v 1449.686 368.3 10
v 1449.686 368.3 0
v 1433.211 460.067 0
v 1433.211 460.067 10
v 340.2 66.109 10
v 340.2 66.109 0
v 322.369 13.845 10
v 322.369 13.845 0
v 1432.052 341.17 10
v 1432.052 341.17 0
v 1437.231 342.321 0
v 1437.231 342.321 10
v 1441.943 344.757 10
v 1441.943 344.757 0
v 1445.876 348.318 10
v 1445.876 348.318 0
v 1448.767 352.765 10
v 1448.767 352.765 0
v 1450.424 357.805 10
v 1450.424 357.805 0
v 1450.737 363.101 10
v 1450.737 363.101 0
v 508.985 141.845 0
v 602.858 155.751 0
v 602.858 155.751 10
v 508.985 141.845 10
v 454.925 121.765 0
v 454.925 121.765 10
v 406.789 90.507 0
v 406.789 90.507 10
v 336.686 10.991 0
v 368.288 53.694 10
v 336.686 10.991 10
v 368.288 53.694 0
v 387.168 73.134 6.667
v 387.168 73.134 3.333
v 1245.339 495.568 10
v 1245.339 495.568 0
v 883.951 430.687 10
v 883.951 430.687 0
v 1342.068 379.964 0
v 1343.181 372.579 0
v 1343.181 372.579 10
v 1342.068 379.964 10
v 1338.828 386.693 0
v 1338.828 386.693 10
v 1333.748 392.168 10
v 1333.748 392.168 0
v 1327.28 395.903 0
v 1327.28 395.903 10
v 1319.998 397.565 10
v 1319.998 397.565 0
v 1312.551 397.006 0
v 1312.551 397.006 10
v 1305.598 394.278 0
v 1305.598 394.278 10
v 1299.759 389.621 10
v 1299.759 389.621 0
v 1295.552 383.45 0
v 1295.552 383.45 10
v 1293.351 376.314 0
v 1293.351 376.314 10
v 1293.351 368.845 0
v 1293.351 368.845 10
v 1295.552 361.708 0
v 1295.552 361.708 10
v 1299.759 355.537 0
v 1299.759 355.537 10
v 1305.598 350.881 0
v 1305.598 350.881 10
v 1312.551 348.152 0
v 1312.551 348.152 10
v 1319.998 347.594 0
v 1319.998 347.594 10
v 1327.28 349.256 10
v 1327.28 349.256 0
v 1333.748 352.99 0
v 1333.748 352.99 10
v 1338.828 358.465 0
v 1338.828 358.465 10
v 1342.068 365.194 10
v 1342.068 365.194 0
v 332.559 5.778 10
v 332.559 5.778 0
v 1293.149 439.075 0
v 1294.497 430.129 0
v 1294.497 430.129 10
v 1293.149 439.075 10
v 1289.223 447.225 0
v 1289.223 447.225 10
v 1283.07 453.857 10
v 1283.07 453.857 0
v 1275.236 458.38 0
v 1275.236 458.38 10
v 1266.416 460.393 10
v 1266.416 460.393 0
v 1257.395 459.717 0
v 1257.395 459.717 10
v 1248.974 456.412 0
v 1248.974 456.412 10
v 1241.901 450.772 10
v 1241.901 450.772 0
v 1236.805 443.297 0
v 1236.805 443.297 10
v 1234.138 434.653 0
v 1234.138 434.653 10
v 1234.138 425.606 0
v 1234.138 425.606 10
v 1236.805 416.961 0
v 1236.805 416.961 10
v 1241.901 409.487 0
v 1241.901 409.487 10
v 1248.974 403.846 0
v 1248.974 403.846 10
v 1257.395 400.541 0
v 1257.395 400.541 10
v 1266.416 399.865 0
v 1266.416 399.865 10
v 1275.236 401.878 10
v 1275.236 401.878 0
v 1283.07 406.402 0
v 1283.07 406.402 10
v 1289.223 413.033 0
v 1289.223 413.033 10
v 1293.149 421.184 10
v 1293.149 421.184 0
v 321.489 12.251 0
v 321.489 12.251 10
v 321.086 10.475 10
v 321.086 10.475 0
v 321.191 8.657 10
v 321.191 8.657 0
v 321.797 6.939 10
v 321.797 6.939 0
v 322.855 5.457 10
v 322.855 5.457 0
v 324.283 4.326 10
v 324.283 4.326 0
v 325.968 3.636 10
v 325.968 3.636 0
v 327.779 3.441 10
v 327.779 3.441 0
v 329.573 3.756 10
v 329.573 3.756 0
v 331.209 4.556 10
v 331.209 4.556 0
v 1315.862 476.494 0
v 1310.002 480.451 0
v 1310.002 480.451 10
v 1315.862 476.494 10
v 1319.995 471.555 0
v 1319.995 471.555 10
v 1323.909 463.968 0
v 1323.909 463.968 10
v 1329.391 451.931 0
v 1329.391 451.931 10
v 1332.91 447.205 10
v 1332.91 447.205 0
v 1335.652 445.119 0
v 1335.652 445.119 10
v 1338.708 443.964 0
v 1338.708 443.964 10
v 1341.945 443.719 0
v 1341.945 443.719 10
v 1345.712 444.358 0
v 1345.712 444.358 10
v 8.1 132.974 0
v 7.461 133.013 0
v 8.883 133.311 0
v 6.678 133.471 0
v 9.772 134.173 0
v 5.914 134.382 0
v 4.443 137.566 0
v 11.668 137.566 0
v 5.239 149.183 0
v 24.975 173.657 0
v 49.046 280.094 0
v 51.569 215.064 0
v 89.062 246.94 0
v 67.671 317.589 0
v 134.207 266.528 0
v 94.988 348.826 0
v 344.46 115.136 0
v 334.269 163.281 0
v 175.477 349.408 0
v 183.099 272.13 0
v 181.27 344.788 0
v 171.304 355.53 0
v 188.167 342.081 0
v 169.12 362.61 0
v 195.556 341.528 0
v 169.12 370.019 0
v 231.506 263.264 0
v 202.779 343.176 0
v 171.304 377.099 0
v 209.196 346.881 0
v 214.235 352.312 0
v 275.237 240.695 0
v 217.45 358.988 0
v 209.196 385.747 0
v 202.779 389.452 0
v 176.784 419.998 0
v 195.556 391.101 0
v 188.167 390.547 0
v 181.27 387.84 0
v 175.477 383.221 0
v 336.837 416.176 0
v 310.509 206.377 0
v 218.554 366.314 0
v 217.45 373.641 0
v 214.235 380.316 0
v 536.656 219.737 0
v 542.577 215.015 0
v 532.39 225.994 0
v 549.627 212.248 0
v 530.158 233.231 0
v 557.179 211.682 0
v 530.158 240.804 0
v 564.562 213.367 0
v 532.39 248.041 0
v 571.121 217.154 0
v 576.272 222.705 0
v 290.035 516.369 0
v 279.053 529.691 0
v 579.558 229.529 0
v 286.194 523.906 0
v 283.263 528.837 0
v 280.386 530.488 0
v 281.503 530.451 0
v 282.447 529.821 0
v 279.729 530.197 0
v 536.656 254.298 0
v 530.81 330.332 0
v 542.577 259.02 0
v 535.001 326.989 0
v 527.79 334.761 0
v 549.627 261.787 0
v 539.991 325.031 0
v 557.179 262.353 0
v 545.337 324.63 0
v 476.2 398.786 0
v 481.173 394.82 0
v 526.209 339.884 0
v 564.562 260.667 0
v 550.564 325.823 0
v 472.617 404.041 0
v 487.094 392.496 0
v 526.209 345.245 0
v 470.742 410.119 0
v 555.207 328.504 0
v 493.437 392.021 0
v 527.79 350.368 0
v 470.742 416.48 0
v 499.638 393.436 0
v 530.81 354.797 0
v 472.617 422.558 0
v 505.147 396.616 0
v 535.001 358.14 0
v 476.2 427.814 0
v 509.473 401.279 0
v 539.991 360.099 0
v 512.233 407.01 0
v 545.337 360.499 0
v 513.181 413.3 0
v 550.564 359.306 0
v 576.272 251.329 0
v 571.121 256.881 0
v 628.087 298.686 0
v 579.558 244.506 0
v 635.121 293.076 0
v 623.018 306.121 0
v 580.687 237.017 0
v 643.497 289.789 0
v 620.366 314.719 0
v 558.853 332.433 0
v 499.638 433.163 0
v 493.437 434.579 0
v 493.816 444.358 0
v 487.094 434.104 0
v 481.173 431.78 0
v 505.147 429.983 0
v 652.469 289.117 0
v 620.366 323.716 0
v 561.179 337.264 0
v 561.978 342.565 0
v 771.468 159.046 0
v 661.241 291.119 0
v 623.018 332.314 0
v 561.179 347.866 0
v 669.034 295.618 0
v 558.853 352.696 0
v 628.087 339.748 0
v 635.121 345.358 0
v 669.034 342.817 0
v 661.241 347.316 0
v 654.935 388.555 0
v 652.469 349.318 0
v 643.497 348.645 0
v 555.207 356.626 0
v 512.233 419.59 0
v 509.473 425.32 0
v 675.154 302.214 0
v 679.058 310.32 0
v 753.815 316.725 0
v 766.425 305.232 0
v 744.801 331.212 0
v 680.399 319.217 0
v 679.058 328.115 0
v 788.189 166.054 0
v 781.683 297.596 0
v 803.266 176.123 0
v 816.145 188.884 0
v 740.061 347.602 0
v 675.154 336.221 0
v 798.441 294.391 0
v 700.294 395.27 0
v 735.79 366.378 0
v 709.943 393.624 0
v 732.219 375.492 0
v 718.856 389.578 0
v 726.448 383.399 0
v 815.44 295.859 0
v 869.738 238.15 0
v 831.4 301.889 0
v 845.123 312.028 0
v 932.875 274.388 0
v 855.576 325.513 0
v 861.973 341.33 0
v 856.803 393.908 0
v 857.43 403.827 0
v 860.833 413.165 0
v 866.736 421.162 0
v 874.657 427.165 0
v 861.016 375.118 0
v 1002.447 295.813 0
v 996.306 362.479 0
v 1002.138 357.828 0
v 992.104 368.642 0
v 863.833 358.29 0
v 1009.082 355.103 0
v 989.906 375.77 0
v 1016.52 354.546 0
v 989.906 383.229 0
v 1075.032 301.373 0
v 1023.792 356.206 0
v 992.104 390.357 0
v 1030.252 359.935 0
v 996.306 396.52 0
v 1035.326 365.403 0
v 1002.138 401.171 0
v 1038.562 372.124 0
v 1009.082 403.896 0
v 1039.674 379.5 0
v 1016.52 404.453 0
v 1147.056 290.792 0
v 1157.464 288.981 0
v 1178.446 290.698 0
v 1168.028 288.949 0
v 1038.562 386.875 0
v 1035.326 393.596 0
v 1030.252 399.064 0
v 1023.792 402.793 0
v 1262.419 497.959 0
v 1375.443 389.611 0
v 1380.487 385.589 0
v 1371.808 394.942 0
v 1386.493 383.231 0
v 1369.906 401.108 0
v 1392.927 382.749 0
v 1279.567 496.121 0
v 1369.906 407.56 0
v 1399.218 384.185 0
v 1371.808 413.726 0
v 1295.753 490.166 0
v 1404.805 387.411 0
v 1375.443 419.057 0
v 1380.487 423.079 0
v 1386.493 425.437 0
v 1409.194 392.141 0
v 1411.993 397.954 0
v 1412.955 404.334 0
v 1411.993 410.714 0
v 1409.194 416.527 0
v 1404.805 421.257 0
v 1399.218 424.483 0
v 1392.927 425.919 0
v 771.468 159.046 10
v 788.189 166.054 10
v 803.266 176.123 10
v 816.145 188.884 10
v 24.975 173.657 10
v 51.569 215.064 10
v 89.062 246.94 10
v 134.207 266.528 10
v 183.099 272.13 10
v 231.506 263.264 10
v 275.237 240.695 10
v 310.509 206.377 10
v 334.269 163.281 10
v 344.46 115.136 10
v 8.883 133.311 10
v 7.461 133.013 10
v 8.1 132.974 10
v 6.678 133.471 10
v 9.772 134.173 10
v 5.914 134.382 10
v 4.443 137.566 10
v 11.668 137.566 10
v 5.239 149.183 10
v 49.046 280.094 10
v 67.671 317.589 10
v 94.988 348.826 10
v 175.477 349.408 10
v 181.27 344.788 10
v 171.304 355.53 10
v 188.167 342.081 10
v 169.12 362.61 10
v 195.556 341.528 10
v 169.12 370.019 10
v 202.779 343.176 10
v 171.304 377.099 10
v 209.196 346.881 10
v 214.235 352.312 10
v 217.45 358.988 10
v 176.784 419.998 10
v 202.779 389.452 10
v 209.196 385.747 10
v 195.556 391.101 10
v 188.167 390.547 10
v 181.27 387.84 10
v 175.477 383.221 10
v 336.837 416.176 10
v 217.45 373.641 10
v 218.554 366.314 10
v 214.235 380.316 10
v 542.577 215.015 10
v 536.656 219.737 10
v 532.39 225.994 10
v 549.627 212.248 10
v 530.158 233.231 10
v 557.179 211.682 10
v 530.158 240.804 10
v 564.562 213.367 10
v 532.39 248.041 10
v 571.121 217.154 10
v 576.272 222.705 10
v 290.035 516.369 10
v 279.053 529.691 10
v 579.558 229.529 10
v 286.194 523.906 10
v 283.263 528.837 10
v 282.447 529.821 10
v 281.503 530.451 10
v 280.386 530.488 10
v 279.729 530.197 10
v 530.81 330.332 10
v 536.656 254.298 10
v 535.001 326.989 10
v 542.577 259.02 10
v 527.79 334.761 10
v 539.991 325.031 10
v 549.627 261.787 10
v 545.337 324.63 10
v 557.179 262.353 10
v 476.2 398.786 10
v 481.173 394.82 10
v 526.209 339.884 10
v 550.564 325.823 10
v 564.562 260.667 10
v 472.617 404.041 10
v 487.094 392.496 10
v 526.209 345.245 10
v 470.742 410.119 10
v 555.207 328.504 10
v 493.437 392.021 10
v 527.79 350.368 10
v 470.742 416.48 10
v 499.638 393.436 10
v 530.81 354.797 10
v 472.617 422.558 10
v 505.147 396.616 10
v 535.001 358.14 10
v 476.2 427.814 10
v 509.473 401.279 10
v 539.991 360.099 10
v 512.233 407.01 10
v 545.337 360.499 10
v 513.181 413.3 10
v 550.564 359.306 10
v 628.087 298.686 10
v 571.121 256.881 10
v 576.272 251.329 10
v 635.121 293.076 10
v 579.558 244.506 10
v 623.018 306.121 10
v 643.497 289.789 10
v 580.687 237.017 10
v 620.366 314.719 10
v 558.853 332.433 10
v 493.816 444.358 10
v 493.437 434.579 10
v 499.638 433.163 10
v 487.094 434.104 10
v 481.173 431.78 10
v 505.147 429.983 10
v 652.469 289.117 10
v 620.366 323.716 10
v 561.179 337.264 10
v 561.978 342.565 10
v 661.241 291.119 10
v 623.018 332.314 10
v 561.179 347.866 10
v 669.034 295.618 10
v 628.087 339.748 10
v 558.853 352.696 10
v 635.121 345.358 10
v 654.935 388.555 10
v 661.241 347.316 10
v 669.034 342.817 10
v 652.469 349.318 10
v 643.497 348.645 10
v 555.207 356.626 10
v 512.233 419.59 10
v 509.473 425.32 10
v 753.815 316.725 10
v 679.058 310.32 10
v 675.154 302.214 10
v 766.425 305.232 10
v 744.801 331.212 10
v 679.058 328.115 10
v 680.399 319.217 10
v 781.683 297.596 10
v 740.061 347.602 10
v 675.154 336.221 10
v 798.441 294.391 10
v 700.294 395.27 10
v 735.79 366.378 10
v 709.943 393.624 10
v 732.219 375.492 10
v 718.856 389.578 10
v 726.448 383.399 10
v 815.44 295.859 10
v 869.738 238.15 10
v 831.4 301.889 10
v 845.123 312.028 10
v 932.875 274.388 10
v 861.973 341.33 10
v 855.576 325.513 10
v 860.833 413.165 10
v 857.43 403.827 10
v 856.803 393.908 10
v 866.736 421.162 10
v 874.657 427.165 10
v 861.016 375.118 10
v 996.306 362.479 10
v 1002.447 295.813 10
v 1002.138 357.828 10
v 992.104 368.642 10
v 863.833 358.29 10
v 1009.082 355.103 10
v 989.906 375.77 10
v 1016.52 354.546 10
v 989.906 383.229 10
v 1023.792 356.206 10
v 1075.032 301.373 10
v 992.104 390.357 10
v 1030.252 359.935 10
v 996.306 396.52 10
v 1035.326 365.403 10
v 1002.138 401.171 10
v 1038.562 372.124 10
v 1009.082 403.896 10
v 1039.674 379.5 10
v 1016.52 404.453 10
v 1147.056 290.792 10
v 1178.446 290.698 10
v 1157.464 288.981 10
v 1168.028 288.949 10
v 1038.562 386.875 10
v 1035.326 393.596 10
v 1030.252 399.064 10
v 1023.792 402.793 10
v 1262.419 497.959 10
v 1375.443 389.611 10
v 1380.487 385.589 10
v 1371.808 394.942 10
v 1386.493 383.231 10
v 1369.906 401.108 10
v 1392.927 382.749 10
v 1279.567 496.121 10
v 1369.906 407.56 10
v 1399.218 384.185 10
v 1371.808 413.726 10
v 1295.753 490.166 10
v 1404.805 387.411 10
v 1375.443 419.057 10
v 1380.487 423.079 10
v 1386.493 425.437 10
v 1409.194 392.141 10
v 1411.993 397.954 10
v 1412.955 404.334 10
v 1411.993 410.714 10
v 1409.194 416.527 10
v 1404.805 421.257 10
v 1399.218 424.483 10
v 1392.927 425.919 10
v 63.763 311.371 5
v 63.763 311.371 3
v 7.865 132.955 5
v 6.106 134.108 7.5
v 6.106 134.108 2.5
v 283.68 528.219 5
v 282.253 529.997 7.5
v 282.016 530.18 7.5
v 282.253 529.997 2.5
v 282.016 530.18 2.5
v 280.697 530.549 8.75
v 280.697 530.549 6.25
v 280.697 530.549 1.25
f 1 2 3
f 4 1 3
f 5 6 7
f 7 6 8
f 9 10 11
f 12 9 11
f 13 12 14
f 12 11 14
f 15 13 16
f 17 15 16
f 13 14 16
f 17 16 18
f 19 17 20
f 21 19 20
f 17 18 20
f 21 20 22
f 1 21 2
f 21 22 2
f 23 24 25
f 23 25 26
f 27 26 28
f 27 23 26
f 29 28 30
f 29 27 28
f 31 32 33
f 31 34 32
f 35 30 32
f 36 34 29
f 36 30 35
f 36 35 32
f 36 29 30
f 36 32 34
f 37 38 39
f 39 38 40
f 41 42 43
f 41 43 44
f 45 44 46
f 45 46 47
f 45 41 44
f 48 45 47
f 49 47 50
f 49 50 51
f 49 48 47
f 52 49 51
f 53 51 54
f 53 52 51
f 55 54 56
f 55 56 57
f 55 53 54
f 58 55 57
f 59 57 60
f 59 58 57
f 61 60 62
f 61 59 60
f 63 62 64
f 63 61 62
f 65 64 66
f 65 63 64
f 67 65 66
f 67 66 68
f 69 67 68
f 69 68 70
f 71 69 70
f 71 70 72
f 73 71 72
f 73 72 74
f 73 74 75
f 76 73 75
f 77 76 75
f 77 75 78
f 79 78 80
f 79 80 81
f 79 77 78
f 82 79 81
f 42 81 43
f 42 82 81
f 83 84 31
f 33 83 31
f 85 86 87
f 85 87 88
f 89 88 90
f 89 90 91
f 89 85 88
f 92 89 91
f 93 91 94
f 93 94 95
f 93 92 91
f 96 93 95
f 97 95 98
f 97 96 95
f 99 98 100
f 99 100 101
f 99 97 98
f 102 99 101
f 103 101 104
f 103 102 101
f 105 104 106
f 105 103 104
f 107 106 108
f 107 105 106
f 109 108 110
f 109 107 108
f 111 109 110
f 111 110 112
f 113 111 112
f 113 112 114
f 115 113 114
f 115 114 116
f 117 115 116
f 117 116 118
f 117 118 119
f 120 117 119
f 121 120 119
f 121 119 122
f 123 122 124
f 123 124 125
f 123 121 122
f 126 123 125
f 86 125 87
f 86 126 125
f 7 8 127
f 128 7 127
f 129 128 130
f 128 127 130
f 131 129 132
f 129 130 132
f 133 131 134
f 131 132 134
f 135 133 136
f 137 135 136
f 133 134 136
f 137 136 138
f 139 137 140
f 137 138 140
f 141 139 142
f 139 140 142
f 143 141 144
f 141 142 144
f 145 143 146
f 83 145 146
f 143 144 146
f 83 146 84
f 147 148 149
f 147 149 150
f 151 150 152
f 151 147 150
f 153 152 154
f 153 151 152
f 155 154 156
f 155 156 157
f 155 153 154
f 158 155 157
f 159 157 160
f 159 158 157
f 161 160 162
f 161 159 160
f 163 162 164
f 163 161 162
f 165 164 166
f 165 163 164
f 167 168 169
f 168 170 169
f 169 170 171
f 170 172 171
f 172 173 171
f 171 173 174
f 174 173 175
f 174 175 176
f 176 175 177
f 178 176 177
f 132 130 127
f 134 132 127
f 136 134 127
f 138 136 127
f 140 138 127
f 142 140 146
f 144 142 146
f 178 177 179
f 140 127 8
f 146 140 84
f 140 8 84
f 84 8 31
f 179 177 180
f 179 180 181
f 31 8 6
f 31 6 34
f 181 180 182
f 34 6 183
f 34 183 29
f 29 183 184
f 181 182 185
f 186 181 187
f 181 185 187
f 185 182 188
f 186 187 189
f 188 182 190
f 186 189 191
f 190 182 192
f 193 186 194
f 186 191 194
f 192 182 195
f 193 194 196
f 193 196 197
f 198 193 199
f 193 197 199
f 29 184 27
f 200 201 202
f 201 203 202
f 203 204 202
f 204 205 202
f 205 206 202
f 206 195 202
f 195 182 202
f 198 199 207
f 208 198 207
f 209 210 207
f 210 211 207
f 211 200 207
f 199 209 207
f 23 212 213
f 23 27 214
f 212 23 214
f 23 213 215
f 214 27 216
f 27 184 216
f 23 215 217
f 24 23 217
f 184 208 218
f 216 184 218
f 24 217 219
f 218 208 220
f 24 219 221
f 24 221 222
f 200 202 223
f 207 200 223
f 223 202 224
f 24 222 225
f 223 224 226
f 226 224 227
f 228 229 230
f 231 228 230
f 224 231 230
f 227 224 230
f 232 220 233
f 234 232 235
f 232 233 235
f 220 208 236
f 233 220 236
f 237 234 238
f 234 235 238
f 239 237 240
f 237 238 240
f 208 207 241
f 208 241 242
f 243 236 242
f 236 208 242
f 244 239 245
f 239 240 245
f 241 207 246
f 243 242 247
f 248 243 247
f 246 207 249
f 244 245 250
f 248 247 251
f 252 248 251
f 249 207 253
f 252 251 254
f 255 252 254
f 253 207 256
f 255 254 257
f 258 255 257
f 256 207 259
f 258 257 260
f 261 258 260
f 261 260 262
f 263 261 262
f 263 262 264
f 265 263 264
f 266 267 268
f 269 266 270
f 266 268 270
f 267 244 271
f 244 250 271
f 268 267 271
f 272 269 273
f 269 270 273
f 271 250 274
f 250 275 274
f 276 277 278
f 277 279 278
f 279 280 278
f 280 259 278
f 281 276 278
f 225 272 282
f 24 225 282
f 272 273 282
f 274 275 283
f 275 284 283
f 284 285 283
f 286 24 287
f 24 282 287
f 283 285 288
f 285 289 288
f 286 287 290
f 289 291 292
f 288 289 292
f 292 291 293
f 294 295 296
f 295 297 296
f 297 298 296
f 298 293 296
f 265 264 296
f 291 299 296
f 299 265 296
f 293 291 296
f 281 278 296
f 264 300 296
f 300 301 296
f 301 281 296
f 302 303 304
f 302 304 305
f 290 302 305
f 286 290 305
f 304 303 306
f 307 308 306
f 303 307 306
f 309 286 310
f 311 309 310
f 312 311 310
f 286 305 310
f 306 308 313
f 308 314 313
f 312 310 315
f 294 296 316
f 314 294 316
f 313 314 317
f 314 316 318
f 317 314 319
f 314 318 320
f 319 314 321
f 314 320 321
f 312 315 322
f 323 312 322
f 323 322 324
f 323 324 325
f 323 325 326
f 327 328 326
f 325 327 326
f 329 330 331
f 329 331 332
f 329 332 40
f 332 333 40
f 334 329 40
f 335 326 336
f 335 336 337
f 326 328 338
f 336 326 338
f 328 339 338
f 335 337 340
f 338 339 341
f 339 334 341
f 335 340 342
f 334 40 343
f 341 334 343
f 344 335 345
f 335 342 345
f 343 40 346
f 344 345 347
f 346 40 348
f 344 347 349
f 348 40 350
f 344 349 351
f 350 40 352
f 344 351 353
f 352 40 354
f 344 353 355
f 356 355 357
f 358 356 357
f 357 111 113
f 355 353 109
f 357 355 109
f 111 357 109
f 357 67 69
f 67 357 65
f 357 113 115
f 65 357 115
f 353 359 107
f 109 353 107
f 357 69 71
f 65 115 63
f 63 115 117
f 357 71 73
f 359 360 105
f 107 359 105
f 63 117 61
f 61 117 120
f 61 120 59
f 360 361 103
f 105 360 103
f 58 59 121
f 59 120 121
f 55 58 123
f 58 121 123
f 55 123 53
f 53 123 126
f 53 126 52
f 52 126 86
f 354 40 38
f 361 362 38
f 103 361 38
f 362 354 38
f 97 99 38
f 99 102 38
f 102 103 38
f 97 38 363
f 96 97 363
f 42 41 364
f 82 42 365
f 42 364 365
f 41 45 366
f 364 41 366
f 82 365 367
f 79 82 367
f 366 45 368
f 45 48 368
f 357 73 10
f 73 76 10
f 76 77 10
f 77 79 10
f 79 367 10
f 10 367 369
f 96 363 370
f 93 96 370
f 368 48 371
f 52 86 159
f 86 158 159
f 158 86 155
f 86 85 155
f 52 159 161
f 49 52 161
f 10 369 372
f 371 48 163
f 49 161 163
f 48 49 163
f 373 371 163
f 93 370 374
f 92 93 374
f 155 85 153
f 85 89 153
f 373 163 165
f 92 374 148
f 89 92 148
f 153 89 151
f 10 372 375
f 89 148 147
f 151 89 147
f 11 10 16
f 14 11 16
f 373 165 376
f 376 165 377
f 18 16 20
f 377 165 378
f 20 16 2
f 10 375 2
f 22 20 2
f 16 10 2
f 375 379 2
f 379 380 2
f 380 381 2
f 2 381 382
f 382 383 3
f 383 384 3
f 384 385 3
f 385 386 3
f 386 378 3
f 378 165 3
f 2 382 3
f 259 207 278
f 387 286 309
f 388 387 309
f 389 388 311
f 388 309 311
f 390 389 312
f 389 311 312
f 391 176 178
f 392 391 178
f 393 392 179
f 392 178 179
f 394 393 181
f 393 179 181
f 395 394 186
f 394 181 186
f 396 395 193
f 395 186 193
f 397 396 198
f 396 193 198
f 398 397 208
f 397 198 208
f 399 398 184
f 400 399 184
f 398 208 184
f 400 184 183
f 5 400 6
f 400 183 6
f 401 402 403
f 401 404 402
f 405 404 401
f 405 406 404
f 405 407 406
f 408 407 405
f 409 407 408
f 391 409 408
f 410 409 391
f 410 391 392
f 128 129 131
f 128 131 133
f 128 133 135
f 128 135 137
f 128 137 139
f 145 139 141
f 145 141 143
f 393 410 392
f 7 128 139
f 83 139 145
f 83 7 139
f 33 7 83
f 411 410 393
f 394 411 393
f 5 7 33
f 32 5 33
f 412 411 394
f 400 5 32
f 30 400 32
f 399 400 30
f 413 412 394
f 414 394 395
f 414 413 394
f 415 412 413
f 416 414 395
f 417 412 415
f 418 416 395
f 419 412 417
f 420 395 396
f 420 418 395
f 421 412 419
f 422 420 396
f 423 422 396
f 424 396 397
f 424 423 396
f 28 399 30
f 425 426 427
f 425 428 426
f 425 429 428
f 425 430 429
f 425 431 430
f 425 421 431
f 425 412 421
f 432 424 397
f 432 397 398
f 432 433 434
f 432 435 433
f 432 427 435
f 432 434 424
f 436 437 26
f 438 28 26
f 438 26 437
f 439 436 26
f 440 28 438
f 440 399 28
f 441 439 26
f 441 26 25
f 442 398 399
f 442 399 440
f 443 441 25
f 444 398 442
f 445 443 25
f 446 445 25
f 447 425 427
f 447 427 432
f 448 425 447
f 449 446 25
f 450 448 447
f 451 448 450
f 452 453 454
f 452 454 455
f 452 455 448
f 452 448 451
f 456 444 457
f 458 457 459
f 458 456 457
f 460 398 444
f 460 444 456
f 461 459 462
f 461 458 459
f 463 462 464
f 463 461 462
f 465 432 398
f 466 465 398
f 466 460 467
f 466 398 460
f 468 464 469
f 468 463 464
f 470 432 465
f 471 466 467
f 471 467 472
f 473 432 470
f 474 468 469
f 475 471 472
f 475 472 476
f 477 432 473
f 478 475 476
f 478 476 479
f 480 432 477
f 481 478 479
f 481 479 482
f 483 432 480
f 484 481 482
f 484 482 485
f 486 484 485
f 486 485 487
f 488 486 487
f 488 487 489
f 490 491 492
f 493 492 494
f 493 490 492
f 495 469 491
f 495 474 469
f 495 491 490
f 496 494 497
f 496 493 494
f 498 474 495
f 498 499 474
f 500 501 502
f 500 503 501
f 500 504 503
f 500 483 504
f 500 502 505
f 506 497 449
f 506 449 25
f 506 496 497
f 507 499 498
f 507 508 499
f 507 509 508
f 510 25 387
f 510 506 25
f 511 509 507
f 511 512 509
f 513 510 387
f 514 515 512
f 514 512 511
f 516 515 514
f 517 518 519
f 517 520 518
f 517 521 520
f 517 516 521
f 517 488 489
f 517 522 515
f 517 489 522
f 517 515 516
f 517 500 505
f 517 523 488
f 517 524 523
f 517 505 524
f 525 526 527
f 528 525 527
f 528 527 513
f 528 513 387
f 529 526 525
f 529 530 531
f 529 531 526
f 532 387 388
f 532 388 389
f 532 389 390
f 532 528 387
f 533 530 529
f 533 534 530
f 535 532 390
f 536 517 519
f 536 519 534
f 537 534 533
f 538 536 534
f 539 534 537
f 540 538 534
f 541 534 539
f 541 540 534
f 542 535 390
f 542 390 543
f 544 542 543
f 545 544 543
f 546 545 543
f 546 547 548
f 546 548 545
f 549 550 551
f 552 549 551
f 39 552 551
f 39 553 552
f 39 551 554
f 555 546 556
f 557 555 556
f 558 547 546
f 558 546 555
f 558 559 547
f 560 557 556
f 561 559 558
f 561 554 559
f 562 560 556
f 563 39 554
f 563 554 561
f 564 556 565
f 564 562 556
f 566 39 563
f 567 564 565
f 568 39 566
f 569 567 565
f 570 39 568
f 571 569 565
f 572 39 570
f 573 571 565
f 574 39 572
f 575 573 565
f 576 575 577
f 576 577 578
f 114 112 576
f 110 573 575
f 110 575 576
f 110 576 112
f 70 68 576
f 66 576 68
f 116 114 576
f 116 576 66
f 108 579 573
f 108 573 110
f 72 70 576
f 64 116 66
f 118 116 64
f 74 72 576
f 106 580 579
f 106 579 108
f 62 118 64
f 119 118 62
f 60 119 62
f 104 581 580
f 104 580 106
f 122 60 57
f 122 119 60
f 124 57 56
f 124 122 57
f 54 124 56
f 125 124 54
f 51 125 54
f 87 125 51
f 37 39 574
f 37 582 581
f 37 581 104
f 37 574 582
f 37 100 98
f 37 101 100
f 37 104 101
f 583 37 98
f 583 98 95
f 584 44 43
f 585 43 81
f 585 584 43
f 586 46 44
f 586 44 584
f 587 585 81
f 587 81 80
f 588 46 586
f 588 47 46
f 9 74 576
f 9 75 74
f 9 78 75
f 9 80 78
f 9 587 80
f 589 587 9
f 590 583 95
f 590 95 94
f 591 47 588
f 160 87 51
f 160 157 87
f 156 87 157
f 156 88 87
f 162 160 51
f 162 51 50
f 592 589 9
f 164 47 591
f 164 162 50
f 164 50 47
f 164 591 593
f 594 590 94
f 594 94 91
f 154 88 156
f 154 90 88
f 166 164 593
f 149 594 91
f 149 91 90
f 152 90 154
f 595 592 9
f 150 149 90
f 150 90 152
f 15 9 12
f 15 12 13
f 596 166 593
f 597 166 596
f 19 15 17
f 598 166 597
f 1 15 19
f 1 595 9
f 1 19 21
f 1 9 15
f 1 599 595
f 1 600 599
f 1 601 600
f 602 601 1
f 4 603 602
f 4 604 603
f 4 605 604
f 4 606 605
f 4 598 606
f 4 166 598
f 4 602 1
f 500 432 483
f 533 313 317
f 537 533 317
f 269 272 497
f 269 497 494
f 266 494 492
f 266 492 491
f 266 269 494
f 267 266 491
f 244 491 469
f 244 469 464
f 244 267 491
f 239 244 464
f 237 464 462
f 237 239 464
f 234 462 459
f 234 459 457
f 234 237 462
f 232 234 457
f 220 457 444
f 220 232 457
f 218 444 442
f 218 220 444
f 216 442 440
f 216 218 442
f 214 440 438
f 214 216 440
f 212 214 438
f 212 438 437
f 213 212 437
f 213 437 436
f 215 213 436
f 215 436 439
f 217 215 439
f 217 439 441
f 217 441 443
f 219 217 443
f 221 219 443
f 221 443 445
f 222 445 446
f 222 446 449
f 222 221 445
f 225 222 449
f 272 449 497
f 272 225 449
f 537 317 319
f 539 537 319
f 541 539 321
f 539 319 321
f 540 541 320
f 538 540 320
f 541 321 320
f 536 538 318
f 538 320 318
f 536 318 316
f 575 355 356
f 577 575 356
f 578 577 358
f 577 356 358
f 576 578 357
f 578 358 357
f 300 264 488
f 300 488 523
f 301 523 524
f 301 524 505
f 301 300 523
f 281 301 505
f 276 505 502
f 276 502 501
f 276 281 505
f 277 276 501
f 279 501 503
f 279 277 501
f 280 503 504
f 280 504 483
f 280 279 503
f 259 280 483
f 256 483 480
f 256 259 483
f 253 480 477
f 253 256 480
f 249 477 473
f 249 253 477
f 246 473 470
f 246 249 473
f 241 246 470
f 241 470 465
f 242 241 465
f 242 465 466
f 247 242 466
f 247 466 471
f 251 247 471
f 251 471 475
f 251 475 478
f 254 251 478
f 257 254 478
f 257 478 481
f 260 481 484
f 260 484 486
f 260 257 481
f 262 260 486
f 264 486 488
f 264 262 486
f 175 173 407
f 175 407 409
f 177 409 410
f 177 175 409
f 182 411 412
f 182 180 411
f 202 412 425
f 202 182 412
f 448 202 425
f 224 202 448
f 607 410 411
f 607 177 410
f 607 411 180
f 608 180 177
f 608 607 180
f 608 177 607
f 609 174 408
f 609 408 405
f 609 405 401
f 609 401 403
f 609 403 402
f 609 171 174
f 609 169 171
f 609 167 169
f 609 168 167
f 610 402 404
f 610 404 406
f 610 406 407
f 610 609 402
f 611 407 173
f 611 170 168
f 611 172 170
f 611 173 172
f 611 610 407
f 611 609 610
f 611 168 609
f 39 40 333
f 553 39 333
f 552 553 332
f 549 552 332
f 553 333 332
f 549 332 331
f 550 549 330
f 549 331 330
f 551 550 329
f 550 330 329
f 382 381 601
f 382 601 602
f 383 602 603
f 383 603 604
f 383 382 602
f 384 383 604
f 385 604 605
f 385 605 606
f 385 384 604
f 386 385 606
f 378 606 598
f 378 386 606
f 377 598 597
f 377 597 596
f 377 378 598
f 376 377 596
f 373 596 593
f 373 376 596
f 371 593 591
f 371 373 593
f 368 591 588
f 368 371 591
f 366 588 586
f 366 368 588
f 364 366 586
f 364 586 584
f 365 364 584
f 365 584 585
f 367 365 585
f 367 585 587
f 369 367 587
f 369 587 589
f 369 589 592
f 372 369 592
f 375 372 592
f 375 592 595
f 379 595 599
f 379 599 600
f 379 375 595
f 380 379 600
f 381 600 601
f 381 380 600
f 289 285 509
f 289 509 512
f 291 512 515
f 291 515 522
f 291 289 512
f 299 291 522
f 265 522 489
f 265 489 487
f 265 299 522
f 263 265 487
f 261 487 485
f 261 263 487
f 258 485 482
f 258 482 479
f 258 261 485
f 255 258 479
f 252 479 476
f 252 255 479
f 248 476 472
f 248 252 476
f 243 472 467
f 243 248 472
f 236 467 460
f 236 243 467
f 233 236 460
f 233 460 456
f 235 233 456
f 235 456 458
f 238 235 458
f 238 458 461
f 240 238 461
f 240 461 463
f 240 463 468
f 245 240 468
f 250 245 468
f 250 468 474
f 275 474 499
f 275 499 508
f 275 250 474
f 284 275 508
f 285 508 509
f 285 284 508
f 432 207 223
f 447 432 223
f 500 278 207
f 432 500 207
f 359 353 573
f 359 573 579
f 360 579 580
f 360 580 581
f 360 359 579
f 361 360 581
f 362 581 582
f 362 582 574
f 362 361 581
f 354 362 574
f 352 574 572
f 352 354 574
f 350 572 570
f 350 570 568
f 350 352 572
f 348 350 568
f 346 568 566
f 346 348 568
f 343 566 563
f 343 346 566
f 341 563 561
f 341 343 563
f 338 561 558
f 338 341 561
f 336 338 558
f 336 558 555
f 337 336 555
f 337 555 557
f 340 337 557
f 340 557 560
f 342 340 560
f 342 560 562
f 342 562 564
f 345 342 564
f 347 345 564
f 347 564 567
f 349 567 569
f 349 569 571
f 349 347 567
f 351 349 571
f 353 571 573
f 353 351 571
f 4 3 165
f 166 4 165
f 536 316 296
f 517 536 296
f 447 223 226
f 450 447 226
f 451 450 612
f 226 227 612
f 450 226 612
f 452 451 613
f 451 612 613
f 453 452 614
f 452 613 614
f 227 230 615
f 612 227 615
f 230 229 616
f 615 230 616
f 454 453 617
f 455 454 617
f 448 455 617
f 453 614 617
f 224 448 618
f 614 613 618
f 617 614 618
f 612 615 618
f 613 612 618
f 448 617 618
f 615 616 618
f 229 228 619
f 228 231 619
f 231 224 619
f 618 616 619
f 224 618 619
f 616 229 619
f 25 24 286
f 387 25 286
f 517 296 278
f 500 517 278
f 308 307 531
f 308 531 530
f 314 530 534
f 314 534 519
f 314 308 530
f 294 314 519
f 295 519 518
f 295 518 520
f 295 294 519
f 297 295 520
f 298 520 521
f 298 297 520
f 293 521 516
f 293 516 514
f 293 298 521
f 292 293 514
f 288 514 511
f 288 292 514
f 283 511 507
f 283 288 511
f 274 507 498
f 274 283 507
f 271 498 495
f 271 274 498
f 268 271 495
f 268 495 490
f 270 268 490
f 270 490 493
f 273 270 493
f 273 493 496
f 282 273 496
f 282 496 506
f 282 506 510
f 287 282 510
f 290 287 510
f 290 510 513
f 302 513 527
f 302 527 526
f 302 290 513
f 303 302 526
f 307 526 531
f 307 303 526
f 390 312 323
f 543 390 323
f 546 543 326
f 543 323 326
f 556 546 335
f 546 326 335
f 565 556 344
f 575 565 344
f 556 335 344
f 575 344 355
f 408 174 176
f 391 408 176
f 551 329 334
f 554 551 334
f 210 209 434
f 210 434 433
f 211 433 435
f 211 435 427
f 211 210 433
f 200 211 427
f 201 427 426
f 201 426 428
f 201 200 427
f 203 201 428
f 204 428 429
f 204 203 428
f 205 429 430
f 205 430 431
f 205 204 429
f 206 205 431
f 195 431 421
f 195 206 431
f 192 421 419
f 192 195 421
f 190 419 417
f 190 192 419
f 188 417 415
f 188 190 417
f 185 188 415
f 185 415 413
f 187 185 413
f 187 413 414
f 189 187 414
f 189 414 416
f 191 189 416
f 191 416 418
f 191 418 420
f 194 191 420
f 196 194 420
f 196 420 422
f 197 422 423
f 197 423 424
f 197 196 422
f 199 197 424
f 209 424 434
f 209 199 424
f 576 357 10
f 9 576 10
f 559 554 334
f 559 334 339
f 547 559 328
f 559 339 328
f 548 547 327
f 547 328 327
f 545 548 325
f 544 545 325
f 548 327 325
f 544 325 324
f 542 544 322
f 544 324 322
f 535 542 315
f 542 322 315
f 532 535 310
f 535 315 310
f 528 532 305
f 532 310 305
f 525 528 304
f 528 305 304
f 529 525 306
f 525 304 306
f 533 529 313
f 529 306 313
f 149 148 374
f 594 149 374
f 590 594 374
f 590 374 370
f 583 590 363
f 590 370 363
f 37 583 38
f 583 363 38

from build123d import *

# Parameters (mm, degrees)
ESBO_O1_R                = 24.856074233
ESBO_O1_R_2              = 25.406254871
ESBO_O1_R_3              = 30.184904221
ESBO_O1_R_4              = 21.338775915
ESBO_O1_R_5              = 17.98482722
ESBO_O1_R_6              = 25.023662551
ESBO_O1_R_7              = 30.348796638
ESBO_O1_R_8              = 25.055364887
ESBO_O1_R_9              = 21.645313363
RESSALTO_EXTRUS_O1_DEPTH = 10


with BuildPart() as part:
    # Esboço1 → Ressalto-extrusão1 (new body)
    with BuildSketch(Plane.XY):
        with BuildLine():
            Line((493.816315556, 444.358087538), (336.83712263, 416.175588715))
            Line((336.83712263, 416.175588715), (290.035490464, 516.368648598))
            add(Edge.make_bspline(
                [(290.035490464, 516.368648598), (287.712330769, 520.644643169), (285.709418986, 525.710802504), (281.265986128, 531.659576746), (279.052955354, 529.6907922)],
                knots=[0, 0, 0, 0, 0.704309023, 1, 1, 1, 1], degree=3))
            add(Edge.make_bspline(
                [(4.442704708, 137.565976398), (3.757198471, 144.910124968), (9.588977508, 165.574123425), (18.597342097, 197.409333874), (31.667816885, 232.560510285), (42.750119374, 261.921598081), (50.960331868, 286.175825056), (59.845234016, 305.160358554), (71.524226976, 324.368210545), (97.308336237, 353.035153395), (175.533966538, 412.912897239), (235.599895151, 479.180568341), (279.052955354, 529.6907922)],
                knots=[0, 0, 0, 0, 0.044405512, 0.129465835, 0.202697898, 0.272841244, 0.321071573, 0.358778673, 0.400527426, 0.457760414, 0.592733096, 1, 1, 1, 1], degree=3))
            add(Edge.make_bspline(
                [(11.668182442, 137.565976398), (7.674575408, 128.343869258), (4.442704708, 137.565976398)],
                knots=[0, 0, 0, 1, 1, 1], degree=2))
            Line((11.668182442, 137.565976398), (24.9746192, 173.65713897))
            ThreePointArc((24.9746192, 173.65713897), (231.505571154, 263.26360212), (340.200193886, 66.109268304))
            Line((340.200193886, 66.109268304), (322.368909592, 13.84531548))
            ThreePointArc((322.368909592, 13.84531548), (323.529108436, 4.841286631), (332.559115974, 5.778068762))
            Line((332.559115974, 5.778068762), (336.685811006, 10.990736171))
            add(Edge.make_bspline(
                [(602.857777914, 155.75104247), (546.585902339, 152.934744829), (464.371026278, 137.671583224), (381.497521998, 70.826880791), (350.387769673, 34.113841035), (336.685811006, 10.990736171)],
                knots=[0, 0, 0, 0, 0.54543399, 0.746227015, 1, 1, 1, 1], degree=3))
            Line((602.857777914, 155.75104247), (771.468146156, 159.046350592))
            ThreePointArc((771.468146156, 159.046350592), (795.969164257, 170.726749579), (816.144685284, 188.883840748))
            ThreePointArc((816.144685284, 188.883840748), (967.065190477, 287.035860841), (1147.056041634, 290.792379924))
            ThreePointArc((1147.056041634, 290.792379924), (1162.744905831, 288.74123251), (1178.445763781, 290.698456349))
            Line((1178.445763781, 290.698456349), (1432.051862487, 341.170454658))
            ThreePointArc((1432.051862487, 341.170454658), (1447.465281978, 350.447894498), (1449.685854759, 368.30044185))
            Line((1449.685854759, 368.30044185), (1433.211015372, 460.066860678))
            Line((1433.211015372, 460.066860678), (1345.711658236, 444.358087538))
            add(Edge.make_bspline(
                [(1310.002421381, 480.451349667), (1321.199976851, 475.017389977), (1324.559122984, 457.230439111), (1335.770629838, 441.594209845), (1345.711658236, 444.358087538)],
                knots=[0, 0, 0, 0, 0.588753132, 1, 1, 1, 1], degree=3))
            ThreePointArc((1310.002421381, 480.451349667), (1279.566897165, 496.121465608), (1245.338738742, 495.567535219))
            Line((1245.338738742, 495.567535219), (883.95058794, 430.687464526))
            ThreePointArc((883.95058794, 430.687464526), (863.497887041, 417.375021383), (856.802695037, 393.907841737))
            Line((856.802695037, 393.907841737), (861.016179461, 375.118258624))
            ThreePointArc((861.016179461, 375.118258624), (815.4395512, 295.859168797), (740.061153128, 347.602085877))
            Line((740.061153128, 347.602085877), (735.789693525, 366.378480162))
            ThreePointArc((735.789693525, 366.378480162), (722.850722659, 386.73241299), (700.294035725, 395.27029465))
            Line((700.294035725, 395.27029465), (654.935405487, 388.555003202))
            Line((654.935405487, 388.555003202), (493.816315556, 444.358087538))
        make_face()
        with Locations((193.698270161, 366.314181508)):
            Circle(ESBO_O1_R, mode=Mode.SUBTRACT)
        with Locations((555.280371961, 237.017321532)):
            Circle(ESBO_O1_R_2, mode=Mode.SUBTRACT)
        with Locations((650.213694883, 319.217363287)):
            Circle(ESBO_O1_R_3, mode=Mode.SUBTRACT)
        with Locations((491.842444827, 413.29978542)):
            Circle(ESBO_O1_R_4, mode=Mode.SUBTRACT)
        with Locations((543.993369584, 342.564707931)):
            Circle(ESBO_O1_R_5, mode=Mode.SUBTRACT)
        with Locations((1014.650016096, 379.499591773)):
            Circle(ESBO_O1_R_6, mode=Mode.SUBTRACT)
        with Locations((1264.148093295, 430.129268588)):
            Circle(ESBO_O1_R_7, mode=Mode.SUBTRACT)
        with Locations((1318.126095233, 372.579227821)):
            Circle(ESBO_O1_R_8, mode=Mode.SUBTRACT)
        with Locations((1391.309727217, 404.333963321)):
            Circle(ESBO_O1_R_9, mode=Mode.SUBTRACT)
    extrude(amount=RESSALTO_EXTRUS_O1_DEPTH)


solid = part.part
